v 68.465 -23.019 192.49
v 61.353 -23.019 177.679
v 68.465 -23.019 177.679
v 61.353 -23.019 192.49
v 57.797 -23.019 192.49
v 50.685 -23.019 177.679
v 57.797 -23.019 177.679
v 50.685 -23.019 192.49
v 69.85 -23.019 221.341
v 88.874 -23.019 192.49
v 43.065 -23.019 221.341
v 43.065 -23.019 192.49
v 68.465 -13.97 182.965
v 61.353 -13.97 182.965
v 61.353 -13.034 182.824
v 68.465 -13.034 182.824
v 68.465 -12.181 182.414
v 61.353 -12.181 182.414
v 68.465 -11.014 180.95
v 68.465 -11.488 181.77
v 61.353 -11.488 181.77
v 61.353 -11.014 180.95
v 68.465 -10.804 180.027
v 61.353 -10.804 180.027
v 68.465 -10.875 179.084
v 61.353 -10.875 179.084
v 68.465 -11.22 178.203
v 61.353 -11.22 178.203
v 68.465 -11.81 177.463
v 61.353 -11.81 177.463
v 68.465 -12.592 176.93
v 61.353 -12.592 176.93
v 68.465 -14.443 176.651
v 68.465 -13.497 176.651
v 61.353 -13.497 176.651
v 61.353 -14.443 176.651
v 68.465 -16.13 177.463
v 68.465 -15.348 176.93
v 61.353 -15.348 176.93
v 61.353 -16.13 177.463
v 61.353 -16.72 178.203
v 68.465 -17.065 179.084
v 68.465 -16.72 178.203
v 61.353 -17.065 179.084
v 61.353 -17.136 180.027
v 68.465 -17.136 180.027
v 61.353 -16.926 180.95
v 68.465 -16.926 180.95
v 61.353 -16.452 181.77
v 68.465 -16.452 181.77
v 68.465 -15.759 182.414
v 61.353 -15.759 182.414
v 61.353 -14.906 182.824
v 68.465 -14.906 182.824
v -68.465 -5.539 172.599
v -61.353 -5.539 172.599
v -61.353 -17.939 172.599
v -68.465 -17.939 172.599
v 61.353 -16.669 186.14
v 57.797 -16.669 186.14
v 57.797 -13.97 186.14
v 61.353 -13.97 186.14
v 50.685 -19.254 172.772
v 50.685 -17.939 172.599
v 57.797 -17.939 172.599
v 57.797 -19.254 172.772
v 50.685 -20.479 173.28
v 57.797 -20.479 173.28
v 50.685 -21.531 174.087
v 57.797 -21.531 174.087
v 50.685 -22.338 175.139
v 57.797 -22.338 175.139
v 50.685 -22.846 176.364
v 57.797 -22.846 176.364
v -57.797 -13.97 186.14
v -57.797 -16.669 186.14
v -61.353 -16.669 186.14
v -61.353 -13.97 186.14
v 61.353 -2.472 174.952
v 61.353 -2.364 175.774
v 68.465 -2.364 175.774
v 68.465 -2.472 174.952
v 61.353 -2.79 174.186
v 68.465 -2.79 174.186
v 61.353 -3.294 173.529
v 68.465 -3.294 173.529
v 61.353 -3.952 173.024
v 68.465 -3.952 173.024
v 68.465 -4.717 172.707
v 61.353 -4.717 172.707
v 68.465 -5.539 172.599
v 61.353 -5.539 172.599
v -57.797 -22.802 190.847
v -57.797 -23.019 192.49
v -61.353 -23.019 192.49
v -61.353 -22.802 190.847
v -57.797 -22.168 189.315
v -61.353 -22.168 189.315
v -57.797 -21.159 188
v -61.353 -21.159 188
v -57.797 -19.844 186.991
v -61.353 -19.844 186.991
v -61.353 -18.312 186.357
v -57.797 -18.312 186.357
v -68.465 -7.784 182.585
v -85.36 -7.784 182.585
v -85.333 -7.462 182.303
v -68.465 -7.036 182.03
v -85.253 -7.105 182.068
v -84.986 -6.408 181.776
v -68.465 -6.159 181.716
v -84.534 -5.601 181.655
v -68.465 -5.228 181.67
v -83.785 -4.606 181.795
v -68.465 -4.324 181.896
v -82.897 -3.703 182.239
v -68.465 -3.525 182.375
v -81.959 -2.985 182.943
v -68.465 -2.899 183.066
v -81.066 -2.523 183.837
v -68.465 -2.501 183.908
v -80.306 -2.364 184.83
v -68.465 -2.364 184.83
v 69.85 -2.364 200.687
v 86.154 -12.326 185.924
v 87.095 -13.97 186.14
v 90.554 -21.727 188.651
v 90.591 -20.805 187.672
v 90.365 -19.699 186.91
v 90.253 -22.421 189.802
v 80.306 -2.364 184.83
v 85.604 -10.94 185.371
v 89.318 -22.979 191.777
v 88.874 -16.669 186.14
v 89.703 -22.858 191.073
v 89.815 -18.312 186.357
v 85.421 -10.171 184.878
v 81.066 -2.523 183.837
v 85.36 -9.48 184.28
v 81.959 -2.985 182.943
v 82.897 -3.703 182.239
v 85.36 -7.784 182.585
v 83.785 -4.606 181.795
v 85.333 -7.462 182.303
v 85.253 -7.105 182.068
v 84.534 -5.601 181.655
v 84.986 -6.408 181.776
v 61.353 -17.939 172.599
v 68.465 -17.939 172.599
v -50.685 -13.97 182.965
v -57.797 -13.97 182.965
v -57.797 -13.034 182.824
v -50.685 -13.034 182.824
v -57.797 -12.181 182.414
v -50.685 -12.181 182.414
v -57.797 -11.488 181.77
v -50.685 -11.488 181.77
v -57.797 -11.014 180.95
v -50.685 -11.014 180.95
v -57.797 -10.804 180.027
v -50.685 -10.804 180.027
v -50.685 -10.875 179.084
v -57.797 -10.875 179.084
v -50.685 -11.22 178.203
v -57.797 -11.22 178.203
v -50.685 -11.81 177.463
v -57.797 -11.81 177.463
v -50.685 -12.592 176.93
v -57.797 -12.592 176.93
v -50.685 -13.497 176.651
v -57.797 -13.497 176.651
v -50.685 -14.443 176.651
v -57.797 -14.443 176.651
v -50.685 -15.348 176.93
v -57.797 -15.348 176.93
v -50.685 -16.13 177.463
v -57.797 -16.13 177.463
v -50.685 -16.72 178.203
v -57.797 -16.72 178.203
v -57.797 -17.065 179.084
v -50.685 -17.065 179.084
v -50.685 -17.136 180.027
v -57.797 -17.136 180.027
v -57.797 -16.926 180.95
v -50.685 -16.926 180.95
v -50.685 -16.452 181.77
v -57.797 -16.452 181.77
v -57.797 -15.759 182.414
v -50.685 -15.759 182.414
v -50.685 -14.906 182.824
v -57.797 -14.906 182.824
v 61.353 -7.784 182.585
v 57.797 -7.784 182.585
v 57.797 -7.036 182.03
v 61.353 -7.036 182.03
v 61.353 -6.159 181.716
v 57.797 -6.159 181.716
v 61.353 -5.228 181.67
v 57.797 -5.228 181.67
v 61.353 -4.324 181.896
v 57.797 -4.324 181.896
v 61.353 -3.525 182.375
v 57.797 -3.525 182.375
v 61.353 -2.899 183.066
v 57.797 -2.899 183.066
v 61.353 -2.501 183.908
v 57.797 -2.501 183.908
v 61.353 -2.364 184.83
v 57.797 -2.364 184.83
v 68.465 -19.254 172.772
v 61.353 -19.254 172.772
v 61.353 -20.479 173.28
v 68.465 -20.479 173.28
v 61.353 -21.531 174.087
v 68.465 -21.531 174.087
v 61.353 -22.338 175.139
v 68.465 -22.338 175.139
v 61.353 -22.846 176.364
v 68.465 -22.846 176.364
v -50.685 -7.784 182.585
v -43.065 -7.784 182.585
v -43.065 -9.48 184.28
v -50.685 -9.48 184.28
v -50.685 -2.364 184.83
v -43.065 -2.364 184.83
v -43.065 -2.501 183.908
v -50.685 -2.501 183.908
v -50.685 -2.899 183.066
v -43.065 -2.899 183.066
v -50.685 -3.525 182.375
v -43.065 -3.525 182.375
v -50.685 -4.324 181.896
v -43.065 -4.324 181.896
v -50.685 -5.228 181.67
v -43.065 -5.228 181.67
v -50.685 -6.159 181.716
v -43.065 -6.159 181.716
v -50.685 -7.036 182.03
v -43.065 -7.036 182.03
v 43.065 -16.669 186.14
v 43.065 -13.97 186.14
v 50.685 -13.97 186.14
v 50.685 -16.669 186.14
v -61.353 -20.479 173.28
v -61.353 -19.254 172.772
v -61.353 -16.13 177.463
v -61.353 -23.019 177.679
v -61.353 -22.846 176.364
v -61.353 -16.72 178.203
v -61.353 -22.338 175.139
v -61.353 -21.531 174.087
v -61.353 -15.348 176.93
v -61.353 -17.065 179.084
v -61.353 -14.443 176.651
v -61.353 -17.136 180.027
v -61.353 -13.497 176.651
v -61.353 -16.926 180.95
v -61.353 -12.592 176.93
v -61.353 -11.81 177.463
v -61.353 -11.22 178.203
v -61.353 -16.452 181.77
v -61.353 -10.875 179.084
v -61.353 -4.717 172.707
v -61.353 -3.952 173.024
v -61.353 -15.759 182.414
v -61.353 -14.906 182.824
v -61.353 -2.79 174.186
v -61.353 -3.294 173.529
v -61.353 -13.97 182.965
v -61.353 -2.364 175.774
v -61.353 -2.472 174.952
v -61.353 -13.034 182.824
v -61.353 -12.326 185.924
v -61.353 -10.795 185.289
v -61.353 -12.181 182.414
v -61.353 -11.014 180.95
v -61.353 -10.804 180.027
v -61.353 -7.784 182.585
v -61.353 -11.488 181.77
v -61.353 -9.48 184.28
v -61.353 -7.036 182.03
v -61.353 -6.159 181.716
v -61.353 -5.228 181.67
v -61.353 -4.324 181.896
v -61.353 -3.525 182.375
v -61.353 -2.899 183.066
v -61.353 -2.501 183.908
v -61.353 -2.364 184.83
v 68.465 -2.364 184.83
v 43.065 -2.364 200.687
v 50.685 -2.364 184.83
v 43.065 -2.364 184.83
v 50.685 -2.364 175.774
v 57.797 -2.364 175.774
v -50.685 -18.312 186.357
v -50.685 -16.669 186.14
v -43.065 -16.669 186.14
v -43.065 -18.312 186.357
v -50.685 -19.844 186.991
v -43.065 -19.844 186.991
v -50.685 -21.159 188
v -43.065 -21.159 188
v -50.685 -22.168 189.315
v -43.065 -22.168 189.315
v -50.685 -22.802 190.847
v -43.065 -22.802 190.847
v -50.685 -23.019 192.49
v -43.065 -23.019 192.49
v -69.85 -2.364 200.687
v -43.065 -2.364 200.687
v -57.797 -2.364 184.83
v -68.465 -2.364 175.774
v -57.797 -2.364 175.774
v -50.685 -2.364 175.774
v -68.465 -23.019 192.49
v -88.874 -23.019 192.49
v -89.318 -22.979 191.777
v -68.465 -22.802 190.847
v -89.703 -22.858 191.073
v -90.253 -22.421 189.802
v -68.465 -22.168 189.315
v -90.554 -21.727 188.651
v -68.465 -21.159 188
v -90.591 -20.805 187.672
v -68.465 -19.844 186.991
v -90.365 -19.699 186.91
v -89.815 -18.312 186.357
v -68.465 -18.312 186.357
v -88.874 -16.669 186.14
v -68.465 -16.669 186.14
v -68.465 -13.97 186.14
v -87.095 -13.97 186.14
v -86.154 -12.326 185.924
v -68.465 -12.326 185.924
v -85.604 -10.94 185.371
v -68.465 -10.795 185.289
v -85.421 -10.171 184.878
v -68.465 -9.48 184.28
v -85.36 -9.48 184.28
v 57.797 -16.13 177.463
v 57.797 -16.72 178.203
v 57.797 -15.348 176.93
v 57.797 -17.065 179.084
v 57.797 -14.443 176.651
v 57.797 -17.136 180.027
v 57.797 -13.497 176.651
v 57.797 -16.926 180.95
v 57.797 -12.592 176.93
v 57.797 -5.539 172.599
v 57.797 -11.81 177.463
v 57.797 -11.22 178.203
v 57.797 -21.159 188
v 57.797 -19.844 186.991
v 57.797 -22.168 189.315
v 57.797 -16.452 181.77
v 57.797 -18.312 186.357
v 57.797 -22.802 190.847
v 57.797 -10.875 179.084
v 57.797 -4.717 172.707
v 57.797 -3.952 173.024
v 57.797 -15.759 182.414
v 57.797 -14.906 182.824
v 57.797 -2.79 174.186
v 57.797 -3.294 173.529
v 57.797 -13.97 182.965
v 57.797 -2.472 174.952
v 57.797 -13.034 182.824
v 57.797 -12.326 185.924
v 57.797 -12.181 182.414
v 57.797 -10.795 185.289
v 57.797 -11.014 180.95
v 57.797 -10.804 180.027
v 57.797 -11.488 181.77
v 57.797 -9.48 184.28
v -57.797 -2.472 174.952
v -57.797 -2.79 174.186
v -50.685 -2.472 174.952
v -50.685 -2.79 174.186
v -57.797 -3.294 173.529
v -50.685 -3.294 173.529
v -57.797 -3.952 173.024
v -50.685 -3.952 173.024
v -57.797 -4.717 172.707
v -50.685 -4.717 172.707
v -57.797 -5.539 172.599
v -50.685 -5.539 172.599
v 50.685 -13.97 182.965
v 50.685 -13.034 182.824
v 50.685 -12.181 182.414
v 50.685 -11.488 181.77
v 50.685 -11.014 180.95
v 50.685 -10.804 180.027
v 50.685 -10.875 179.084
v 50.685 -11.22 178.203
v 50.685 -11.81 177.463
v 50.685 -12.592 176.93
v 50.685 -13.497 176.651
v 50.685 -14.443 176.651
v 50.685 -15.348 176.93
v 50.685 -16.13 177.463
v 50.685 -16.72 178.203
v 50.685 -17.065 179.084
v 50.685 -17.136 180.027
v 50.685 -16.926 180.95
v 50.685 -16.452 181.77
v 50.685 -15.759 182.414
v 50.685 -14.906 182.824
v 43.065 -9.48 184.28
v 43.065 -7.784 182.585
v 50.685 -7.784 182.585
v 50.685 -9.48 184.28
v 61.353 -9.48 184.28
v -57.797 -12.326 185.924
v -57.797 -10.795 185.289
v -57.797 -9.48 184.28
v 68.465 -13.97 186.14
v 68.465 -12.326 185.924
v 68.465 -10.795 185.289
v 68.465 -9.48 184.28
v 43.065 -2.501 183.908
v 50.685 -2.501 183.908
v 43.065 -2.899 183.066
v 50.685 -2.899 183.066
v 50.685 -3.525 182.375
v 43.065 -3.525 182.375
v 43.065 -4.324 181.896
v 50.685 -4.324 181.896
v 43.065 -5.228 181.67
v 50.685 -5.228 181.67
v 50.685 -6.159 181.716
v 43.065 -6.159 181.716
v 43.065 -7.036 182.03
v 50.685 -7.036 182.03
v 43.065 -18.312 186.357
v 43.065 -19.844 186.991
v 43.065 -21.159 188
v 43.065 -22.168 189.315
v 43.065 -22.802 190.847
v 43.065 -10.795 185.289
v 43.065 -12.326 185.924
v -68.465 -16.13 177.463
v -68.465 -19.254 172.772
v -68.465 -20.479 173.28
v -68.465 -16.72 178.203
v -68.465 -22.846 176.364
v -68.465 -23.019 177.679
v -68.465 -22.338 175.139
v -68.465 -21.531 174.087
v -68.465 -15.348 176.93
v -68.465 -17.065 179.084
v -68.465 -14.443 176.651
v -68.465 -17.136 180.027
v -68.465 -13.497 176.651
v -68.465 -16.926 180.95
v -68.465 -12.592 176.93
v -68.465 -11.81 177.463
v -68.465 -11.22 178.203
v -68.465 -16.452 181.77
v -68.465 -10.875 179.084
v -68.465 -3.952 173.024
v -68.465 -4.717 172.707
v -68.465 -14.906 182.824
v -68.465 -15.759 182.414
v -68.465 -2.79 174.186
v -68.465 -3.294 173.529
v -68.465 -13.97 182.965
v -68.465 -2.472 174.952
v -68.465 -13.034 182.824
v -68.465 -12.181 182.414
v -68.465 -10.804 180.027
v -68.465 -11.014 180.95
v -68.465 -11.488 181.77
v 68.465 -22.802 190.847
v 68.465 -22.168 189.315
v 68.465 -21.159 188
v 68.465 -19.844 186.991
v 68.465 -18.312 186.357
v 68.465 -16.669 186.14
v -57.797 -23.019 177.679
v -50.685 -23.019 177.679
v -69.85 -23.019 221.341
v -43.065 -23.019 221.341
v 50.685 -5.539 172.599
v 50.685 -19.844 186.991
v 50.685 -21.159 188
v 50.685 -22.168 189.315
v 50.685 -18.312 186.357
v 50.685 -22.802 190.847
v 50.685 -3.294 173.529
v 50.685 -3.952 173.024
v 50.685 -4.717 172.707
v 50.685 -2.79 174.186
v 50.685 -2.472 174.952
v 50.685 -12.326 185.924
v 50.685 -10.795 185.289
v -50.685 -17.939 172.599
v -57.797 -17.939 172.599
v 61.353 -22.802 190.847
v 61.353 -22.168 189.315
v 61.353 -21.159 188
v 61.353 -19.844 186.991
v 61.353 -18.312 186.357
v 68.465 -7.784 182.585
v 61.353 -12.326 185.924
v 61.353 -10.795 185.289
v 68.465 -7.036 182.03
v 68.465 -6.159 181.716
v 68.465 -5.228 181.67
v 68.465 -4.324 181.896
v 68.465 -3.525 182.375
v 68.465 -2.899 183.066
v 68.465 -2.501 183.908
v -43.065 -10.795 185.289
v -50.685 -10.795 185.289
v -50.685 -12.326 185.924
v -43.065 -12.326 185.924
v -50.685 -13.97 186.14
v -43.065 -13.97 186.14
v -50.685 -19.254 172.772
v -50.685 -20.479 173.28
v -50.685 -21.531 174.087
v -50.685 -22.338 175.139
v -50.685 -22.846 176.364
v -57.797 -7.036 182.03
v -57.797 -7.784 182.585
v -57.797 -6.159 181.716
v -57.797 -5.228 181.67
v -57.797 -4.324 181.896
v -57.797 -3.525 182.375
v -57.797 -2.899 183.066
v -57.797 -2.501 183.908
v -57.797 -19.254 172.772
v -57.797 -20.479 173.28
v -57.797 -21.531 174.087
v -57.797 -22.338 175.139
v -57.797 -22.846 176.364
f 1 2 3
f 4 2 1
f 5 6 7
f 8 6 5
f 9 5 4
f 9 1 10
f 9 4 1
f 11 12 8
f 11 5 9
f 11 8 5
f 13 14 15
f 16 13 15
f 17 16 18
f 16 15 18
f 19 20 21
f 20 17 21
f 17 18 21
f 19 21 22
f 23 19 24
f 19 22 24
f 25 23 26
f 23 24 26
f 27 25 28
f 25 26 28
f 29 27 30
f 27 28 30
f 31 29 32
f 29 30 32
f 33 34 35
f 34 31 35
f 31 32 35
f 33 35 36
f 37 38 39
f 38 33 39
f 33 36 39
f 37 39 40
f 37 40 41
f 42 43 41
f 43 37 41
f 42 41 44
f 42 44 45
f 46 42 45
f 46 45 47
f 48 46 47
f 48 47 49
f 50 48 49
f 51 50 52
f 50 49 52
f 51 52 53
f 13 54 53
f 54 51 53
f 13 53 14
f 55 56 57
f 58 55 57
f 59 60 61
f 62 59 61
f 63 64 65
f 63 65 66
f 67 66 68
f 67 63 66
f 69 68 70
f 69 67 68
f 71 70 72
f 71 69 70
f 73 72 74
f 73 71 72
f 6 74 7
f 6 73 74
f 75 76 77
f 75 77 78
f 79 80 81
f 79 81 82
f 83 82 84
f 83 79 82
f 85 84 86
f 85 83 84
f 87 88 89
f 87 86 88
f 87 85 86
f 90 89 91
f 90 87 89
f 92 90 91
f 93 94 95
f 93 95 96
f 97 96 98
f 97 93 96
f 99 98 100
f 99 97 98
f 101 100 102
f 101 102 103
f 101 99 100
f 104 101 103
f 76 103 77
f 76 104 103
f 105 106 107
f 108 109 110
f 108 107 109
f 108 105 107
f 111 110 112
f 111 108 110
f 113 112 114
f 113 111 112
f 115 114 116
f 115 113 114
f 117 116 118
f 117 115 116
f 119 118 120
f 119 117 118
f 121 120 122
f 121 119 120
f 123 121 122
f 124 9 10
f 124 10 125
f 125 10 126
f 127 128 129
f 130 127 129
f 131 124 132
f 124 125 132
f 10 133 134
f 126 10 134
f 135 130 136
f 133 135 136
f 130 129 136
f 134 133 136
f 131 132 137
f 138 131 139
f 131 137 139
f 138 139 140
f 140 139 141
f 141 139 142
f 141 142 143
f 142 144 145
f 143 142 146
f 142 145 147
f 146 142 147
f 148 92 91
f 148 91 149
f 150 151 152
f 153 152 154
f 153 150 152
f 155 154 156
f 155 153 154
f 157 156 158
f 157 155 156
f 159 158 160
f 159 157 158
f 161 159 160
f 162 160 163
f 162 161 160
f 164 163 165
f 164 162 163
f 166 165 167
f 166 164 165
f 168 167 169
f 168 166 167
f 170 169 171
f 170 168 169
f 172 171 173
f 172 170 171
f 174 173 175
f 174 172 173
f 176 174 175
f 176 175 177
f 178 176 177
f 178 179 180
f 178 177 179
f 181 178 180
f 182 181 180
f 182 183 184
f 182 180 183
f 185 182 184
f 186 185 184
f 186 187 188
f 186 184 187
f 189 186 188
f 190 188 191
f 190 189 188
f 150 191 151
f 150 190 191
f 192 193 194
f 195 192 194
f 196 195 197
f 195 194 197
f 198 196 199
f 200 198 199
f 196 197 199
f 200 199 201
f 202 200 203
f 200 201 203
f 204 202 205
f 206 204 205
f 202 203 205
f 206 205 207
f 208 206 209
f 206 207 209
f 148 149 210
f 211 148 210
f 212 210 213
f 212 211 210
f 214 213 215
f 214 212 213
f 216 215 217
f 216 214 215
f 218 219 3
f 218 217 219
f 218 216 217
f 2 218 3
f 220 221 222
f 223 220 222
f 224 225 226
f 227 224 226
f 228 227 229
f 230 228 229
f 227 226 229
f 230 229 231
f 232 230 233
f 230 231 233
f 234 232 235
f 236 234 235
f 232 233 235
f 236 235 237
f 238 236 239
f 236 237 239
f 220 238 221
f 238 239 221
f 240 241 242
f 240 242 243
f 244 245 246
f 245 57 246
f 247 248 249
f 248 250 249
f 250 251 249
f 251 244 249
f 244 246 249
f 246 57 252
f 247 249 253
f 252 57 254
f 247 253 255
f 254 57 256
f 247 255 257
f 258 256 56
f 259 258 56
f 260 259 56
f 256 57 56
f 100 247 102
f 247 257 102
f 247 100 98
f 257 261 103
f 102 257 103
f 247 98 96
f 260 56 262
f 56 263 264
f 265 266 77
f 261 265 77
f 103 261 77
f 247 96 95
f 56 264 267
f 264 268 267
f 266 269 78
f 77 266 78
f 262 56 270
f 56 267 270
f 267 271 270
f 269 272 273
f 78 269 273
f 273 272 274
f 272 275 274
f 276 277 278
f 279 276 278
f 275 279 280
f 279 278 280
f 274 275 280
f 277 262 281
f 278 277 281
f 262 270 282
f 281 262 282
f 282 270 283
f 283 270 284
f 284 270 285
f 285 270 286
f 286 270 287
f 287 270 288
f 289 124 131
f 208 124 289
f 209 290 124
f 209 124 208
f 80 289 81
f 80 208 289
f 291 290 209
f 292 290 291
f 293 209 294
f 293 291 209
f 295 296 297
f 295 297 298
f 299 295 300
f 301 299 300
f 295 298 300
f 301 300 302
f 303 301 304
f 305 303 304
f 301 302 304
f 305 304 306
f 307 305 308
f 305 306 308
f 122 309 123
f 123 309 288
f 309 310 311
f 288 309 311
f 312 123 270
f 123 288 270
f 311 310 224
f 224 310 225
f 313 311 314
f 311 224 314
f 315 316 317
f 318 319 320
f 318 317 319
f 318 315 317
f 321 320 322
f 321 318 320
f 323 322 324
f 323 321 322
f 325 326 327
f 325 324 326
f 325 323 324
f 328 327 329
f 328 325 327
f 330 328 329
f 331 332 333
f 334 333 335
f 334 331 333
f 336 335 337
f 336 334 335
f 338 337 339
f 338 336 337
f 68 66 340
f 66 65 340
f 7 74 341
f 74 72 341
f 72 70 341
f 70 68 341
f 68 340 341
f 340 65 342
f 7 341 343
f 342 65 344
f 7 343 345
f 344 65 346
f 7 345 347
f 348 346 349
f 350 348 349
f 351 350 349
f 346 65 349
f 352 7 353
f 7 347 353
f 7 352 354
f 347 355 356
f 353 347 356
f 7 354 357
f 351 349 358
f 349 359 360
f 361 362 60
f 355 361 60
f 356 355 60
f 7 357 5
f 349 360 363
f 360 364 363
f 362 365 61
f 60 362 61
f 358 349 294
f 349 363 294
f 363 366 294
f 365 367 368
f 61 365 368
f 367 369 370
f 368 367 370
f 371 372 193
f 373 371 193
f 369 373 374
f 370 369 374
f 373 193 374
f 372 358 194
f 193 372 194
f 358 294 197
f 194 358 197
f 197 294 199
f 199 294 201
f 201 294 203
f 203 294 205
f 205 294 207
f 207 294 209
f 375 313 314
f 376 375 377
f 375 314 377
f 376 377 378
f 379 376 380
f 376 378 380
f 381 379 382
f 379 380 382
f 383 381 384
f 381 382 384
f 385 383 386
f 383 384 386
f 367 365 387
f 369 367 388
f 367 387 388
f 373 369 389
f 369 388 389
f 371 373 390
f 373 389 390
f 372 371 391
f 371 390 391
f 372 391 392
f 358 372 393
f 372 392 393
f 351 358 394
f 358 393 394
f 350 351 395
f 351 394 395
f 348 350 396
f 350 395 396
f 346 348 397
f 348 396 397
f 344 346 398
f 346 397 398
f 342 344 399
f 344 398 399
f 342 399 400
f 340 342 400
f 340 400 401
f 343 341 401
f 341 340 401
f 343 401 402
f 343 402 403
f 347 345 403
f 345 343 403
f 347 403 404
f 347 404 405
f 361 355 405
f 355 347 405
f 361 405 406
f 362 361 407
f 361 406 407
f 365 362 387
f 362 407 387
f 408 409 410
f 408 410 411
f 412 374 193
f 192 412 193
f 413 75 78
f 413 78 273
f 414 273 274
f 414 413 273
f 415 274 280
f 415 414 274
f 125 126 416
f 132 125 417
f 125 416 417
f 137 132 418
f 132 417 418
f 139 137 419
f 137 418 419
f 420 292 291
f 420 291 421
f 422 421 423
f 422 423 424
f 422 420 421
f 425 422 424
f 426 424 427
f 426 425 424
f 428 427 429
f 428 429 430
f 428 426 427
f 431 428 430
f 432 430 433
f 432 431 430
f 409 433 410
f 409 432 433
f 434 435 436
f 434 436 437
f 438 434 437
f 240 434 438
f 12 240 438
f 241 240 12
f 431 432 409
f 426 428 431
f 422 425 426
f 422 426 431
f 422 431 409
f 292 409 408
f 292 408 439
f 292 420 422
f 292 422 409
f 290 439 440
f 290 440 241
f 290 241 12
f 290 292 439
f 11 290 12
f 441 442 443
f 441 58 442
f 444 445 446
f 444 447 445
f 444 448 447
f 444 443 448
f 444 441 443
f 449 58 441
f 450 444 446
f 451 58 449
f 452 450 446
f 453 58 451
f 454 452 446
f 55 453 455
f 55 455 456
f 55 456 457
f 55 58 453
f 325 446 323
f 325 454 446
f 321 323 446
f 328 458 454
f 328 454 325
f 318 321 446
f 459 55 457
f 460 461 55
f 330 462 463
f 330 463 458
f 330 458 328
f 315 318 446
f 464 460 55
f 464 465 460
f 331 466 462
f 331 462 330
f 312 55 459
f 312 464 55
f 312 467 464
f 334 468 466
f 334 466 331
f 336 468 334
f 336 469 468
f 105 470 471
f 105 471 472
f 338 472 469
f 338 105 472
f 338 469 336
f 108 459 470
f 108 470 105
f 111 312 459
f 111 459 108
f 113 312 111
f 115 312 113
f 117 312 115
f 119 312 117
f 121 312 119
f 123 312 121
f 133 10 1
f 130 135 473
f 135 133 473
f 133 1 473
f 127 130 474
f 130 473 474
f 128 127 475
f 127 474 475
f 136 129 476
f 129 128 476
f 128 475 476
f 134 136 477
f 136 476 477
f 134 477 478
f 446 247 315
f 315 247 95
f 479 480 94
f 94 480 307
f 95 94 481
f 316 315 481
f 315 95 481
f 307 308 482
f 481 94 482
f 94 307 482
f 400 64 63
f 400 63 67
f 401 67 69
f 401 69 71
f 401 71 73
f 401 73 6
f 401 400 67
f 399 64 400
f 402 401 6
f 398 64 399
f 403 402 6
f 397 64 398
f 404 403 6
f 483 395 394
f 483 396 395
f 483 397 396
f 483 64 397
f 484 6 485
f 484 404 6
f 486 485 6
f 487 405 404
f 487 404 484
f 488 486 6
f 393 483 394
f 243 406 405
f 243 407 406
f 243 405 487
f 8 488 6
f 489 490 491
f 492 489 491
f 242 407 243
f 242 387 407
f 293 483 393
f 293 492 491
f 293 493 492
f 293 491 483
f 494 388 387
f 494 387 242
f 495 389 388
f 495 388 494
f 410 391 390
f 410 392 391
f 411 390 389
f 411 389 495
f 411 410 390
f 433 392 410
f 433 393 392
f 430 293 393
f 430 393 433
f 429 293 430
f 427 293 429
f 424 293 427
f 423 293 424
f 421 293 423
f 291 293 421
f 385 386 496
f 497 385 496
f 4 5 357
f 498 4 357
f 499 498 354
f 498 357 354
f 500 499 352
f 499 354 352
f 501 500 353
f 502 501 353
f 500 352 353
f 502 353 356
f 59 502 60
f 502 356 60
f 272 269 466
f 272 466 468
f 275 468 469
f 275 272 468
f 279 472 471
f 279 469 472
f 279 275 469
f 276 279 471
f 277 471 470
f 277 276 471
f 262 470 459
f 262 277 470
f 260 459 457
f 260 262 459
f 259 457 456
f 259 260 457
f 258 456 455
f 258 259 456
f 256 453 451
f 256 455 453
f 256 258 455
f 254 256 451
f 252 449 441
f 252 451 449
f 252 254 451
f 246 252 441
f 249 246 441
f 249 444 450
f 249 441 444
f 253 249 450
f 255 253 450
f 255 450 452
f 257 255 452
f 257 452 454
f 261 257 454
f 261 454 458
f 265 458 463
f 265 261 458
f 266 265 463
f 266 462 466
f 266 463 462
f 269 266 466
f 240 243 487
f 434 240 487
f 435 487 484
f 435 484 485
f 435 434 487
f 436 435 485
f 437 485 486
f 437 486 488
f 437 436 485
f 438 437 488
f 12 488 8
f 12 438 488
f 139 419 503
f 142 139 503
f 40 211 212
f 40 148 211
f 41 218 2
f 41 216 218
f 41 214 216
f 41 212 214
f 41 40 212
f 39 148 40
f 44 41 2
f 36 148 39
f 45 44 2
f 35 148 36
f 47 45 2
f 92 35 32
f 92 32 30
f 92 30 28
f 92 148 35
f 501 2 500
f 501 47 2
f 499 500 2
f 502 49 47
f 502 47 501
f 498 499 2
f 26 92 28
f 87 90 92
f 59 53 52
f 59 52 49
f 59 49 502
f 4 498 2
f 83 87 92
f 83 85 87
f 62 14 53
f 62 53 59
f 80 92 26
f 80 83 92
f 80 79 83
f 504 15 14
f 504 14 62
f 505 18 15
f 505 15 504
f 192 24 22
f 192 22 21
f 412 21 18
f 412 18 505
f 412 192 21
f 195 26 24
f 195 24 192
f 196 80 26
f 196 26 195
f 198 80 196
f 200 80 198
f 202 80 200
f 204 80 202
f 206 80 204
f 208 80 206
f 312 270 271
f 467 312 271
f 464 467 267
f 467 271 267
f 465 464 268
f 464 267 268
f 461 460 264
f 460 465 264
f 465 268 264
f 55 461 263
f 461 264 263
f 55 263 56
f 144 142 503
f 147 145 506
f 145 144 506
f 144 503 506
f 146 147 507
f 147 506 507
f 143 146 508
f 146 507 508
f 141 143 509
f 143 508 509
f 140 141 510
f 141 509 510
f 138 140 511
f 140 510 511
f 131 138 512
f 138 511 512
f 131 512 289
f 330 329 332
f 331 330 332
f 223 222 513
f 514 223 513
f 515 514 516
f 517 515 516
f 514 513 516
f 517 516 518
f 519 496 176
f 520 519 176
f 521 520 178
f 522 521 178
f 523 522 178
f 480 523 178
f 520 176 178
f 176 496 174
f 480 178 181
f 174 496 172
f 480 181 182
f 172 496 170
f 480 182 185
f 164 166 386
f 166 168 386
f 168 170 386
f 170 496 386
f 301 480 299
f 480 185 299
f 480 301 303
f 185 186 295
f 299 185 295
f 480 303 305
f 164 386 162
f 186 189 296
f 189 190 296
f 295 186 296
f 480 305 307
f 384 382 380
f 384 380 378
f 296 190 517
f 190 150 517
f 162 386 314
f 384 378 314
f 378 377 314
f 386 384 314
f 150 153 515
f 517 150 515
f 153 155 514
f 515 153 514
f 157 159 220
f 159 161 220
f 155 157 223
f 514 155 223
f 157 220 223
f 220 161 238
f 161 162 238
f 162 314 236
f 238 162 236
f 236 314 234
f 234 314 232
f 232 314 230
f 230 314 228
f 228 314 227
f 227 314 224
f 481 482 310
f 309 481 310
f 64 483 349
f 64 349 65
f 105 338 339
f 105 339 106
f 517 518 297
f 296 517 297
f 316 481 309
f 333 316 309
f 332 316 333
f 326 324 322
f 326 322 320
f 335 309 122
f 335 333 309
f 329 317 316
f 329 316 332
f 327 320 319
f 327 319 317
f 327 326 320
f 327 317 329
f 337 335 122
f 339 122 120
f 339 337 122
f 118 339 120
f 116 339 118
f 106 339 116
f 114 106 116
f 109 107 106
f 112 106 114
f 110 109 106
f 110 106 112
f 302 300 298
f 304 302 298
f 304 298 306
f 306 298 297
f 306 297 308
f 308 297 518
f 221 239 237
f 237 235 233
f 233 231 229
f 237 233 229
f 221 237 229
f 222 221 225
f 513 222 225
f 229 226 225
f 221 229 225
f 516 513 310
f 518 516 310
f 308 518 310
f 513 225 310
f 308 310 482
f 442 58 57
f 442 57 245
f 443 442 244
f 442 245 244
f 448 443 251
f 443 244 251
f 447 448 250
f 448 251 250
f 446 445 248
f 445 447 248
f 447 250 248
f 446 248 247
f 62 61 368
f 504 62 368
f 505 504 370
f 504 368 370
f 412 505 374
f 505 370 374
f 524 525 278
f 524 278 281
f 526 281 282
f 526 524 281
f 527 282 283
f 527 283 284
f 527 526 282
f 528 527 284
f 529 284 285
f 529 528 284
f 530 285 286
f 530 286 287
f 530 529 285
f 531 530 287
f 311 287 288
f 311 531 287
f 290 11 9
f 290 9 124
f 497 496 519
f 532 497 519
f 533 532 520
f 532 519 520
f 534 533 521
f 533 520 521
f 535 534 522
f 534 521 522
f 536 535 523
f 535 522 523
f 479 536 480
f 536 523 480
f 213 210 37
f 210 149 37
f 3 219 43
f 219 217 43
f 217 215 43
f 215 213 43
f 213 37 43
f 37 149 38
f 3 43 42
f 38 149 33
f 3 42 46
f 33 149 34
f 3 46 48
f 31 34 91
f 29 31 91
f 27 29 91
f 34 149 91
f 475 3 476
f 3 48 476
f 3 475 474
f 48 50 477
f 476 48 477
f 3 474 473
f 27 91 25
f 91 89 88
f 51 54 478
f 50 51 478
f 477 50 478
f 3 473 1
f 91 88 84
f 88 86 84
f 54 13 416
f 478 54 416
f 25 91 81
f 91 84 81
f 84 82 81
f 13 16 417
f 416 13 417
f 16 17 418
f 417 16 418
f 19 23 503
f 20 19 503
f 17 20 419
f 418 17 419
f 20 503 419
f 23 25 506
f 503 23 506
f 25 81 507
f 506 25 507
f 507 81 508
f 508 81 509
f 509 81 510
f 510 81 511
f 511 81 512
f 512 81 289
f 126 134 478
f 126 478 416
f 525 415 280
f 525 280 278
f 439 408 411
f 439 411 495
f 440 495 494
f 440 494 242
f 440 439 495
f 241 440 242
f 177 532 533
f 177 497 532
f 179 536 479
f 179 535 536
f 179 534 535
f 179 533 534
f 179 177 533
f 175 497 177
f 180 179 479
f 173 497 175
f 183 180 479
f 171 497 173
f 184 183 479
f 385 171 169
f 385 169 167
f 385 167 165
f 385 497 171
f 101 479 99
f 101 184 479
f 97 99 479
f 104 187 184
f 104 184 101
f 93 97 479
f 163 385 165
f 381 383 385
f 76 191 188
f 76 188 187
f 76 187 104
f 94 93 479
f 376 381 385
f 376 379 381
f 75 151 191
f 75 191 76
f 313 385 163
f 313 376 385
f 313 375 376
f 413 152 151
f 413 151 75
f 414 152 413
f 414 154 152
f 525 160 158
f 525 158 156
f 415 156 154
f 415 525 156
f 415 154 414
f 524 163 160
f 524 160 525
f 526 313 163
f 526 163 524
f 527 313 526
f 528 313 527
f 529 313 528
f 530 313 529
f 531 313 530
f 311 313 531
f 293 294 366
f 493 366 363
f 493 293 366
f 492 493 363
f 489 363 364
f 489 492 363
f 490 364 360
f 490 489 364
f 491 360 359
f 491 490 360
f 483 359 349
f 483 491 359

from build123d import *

# Parameters (mm, degrees)
SKETCH1_R           = 3.175
BOSS_EXTRUDE1_DEPTH = 50.8
SKETCH3_W           = 47.755928299
SKETCH3_H           = 45.242977947
CUT_EXTRUDE1_DEPTH  = 187.213946056
CUT_EXTRUDE2_START  = -7.112
CUT_EXTRUDE2_DEPTH  = 3.556
CUT_EXTRUDE3_START  = -17.78
CUT_EXTRUDE3_DEPTH  = 211.159843601
BOSS_EXTRUDE2_START = 7.62
BOSS_EXTRUDE2_DEPTH = 7.62


with BuildPart() as part:
    # Sketch1 → Boss-Extrude1 (new body)
    with BuildSketch(Plane.ZY.offset(50.684999952)):
        with BuildLine():
            Line((221.341334172, -23.01875), (200.686745093, -2.364160922))
            Line((200.686745093, -2.364160922), (175.773969826, -2.364160922))
            ThreePointArc((175.773969826, -2.364160922), (173.528905796, -3.294096891), (172.598969826, -5.539160922))
            Line((172.598969826, -5.539160922), (172.598969826, -17.93875))
            ThreePointArc((172.598969826, -17.93875), (174.086867378, -21.530852448), (177.678969826, -23.01875))
            Line((177.678969826, -23.01875), (221.341334172, -23.01875))
        make_face()
        with Locations((179.790221791, -13.97)):
            Circle(SKETCH1_R, mode=Mode.SUBTRACT)
    extrude(amount=BOSS_EXTRUDE1_DEPTH)

    # Sketch3 → Cut-Extrude1 (cut, through all)
    with BuildSketch(Plane(origin=(-107.308063907, 70.757621847, 70.757621847), x_dir=(0, 0.7071067811865436, -0.7071067811865516), z_dir=(-0.7313537016191718, 0.4822456651582992, 0.4822456651582937))):
        with Locations((-148.910708419, -32.302490469)):
            Rectangle(SKETCH3_W, SKETCH3_H)
    extrude(amount=CUT_EXTRUDE1_DEPTH, mode=Mode.SUBTRACT)

    # Sketch4 → Cut-Extrude2 (cut)
    with BuildSketch(Plane(origin=(-50.684999952, 0, 0), x_dir=(0, 0, -1), z_dir=(1, 0, 0)).offset(CUT_EXTRUDE2_START)):
        with BuildLine():
            Line((-184.280349852, -9.479871939), (-182.584702864, -7.784224952))
            ThreePointArc((-182.584702864, -7.784224952), (-181.896449379, -4.324141024), (-184.829766894, -2.364160922))
            Line((-184.829766894, -2.364160922), (-172.598969826, -2.364160922))
            Line((-172.598969826, -2.364160922), (-172.598969826, -23.01875))
            Line((-172.598969826, -23.01875), (-192.490221791, -23.01875))
            ThreePointArc((-192.490221791, -23.01875), (-188.000093731, -21.158878061), (-186.140221791, -16.66875))
            Line((-186.140221791, -16.66875), (-186.140221791, -13.97))
            ThreePointArc((-186.140221791, -13.97), (-185.656856823, -11.539960204), (-184.280349852, -9.479871939))
        make_face()
    extrude(amount=-CUT_EXTRUDE2_DEPTH, mode=Mode.SUBTRACT)

    # Sketch4<2> → Cut-Extrude3 (cut, through all)
    with BuildSketch(Plane(origin=(-50.684999952, 0, 0), x_dir=(0, 0, -1), z_dir=(1, 0, 0)).offset(CUT_EXTRUDE3_START)):
        with BuildLine():
            Line((-184.280349852, -9.479871939), (-182.584702864, -7.784224952))
            ThreePointArc((-182.584702864, -7.784224952), (-181.896449379, -4.324141024), (-184.829766894, -2.364160922))
            Line((-184.829766894, -2.364160922), (-172.598969826, -2.364160922))
            Line((-172.598969826, -2.364160922), (-172.598969826, -23.01875))
            Line((-172.598969826, -23.01875), (-192.490221791, -23.01875))
            ThreePointArc((-192.490221791, -23.01875), (-188.000093731, -21.158878061), (-186.140221791, -16.66875))
            Line((-186.140221791, -16.66875), (-186.140221791, -13.97))
            ThreePointArc((-186.140221791, -13.97), (-185.656856823, -11.539960204), (-184.280349852, -9.479871939))
        make_face()
    extrude(amount=-CUT_EXTRUDE3_DEPTH, mode=Mode.SUBTRACT)

    # Sketch5 → Boss-Extrude2 (add)
    with BuildSketch(Plane(origin=(-50.684999952, 0, 0), x_dir=(0, 0, -1), z_dir=(1, 0, 0)).offset(BOSS_EXTRUDE2_START)):
        with BuildLine():
            Line((-182.584702864, -7.784224952), (-184.280349852, -9.479871939))
            ThreePointArc((-184.280349852, -9.479871939), (-185.656856823, -11.539960204), (-186.140221791, -13.97))
            Line((-186.140221791, -13.97), (-186.140221791, -16.66875))
            ThreePointArc((-186.140221791, -16.66875), (-188.000093731, -21.158878061), (-192.490221791, -23.01875))
            Line((-192.490221791, -23.01875), (-221.341334172, -23.01875))
            Line((-221.341334172, -23.01875), (-200.686745093, -2.364160922))
            Line((-200.686745093, -2.364160922), (-184.829766894, -2.364160922))
            ThreePointArc((-184.829766894, -2.364160922), (-181.896449379, -4.324141024), (-182.584702864, -7.784224952))
        make_face()
    extrude(amount=-BOSS_EXTRUDE2_DEPTH)


with BuildPart() as body_2:
    # Mirror2: mirrored copy
    add(part.part.mirror(Plane(origin=(0, 0, 0), x_dir=(0, 0, 1), z_dir=(1, 0, 0))))


solid = Compound([part.part, body_2.part])
